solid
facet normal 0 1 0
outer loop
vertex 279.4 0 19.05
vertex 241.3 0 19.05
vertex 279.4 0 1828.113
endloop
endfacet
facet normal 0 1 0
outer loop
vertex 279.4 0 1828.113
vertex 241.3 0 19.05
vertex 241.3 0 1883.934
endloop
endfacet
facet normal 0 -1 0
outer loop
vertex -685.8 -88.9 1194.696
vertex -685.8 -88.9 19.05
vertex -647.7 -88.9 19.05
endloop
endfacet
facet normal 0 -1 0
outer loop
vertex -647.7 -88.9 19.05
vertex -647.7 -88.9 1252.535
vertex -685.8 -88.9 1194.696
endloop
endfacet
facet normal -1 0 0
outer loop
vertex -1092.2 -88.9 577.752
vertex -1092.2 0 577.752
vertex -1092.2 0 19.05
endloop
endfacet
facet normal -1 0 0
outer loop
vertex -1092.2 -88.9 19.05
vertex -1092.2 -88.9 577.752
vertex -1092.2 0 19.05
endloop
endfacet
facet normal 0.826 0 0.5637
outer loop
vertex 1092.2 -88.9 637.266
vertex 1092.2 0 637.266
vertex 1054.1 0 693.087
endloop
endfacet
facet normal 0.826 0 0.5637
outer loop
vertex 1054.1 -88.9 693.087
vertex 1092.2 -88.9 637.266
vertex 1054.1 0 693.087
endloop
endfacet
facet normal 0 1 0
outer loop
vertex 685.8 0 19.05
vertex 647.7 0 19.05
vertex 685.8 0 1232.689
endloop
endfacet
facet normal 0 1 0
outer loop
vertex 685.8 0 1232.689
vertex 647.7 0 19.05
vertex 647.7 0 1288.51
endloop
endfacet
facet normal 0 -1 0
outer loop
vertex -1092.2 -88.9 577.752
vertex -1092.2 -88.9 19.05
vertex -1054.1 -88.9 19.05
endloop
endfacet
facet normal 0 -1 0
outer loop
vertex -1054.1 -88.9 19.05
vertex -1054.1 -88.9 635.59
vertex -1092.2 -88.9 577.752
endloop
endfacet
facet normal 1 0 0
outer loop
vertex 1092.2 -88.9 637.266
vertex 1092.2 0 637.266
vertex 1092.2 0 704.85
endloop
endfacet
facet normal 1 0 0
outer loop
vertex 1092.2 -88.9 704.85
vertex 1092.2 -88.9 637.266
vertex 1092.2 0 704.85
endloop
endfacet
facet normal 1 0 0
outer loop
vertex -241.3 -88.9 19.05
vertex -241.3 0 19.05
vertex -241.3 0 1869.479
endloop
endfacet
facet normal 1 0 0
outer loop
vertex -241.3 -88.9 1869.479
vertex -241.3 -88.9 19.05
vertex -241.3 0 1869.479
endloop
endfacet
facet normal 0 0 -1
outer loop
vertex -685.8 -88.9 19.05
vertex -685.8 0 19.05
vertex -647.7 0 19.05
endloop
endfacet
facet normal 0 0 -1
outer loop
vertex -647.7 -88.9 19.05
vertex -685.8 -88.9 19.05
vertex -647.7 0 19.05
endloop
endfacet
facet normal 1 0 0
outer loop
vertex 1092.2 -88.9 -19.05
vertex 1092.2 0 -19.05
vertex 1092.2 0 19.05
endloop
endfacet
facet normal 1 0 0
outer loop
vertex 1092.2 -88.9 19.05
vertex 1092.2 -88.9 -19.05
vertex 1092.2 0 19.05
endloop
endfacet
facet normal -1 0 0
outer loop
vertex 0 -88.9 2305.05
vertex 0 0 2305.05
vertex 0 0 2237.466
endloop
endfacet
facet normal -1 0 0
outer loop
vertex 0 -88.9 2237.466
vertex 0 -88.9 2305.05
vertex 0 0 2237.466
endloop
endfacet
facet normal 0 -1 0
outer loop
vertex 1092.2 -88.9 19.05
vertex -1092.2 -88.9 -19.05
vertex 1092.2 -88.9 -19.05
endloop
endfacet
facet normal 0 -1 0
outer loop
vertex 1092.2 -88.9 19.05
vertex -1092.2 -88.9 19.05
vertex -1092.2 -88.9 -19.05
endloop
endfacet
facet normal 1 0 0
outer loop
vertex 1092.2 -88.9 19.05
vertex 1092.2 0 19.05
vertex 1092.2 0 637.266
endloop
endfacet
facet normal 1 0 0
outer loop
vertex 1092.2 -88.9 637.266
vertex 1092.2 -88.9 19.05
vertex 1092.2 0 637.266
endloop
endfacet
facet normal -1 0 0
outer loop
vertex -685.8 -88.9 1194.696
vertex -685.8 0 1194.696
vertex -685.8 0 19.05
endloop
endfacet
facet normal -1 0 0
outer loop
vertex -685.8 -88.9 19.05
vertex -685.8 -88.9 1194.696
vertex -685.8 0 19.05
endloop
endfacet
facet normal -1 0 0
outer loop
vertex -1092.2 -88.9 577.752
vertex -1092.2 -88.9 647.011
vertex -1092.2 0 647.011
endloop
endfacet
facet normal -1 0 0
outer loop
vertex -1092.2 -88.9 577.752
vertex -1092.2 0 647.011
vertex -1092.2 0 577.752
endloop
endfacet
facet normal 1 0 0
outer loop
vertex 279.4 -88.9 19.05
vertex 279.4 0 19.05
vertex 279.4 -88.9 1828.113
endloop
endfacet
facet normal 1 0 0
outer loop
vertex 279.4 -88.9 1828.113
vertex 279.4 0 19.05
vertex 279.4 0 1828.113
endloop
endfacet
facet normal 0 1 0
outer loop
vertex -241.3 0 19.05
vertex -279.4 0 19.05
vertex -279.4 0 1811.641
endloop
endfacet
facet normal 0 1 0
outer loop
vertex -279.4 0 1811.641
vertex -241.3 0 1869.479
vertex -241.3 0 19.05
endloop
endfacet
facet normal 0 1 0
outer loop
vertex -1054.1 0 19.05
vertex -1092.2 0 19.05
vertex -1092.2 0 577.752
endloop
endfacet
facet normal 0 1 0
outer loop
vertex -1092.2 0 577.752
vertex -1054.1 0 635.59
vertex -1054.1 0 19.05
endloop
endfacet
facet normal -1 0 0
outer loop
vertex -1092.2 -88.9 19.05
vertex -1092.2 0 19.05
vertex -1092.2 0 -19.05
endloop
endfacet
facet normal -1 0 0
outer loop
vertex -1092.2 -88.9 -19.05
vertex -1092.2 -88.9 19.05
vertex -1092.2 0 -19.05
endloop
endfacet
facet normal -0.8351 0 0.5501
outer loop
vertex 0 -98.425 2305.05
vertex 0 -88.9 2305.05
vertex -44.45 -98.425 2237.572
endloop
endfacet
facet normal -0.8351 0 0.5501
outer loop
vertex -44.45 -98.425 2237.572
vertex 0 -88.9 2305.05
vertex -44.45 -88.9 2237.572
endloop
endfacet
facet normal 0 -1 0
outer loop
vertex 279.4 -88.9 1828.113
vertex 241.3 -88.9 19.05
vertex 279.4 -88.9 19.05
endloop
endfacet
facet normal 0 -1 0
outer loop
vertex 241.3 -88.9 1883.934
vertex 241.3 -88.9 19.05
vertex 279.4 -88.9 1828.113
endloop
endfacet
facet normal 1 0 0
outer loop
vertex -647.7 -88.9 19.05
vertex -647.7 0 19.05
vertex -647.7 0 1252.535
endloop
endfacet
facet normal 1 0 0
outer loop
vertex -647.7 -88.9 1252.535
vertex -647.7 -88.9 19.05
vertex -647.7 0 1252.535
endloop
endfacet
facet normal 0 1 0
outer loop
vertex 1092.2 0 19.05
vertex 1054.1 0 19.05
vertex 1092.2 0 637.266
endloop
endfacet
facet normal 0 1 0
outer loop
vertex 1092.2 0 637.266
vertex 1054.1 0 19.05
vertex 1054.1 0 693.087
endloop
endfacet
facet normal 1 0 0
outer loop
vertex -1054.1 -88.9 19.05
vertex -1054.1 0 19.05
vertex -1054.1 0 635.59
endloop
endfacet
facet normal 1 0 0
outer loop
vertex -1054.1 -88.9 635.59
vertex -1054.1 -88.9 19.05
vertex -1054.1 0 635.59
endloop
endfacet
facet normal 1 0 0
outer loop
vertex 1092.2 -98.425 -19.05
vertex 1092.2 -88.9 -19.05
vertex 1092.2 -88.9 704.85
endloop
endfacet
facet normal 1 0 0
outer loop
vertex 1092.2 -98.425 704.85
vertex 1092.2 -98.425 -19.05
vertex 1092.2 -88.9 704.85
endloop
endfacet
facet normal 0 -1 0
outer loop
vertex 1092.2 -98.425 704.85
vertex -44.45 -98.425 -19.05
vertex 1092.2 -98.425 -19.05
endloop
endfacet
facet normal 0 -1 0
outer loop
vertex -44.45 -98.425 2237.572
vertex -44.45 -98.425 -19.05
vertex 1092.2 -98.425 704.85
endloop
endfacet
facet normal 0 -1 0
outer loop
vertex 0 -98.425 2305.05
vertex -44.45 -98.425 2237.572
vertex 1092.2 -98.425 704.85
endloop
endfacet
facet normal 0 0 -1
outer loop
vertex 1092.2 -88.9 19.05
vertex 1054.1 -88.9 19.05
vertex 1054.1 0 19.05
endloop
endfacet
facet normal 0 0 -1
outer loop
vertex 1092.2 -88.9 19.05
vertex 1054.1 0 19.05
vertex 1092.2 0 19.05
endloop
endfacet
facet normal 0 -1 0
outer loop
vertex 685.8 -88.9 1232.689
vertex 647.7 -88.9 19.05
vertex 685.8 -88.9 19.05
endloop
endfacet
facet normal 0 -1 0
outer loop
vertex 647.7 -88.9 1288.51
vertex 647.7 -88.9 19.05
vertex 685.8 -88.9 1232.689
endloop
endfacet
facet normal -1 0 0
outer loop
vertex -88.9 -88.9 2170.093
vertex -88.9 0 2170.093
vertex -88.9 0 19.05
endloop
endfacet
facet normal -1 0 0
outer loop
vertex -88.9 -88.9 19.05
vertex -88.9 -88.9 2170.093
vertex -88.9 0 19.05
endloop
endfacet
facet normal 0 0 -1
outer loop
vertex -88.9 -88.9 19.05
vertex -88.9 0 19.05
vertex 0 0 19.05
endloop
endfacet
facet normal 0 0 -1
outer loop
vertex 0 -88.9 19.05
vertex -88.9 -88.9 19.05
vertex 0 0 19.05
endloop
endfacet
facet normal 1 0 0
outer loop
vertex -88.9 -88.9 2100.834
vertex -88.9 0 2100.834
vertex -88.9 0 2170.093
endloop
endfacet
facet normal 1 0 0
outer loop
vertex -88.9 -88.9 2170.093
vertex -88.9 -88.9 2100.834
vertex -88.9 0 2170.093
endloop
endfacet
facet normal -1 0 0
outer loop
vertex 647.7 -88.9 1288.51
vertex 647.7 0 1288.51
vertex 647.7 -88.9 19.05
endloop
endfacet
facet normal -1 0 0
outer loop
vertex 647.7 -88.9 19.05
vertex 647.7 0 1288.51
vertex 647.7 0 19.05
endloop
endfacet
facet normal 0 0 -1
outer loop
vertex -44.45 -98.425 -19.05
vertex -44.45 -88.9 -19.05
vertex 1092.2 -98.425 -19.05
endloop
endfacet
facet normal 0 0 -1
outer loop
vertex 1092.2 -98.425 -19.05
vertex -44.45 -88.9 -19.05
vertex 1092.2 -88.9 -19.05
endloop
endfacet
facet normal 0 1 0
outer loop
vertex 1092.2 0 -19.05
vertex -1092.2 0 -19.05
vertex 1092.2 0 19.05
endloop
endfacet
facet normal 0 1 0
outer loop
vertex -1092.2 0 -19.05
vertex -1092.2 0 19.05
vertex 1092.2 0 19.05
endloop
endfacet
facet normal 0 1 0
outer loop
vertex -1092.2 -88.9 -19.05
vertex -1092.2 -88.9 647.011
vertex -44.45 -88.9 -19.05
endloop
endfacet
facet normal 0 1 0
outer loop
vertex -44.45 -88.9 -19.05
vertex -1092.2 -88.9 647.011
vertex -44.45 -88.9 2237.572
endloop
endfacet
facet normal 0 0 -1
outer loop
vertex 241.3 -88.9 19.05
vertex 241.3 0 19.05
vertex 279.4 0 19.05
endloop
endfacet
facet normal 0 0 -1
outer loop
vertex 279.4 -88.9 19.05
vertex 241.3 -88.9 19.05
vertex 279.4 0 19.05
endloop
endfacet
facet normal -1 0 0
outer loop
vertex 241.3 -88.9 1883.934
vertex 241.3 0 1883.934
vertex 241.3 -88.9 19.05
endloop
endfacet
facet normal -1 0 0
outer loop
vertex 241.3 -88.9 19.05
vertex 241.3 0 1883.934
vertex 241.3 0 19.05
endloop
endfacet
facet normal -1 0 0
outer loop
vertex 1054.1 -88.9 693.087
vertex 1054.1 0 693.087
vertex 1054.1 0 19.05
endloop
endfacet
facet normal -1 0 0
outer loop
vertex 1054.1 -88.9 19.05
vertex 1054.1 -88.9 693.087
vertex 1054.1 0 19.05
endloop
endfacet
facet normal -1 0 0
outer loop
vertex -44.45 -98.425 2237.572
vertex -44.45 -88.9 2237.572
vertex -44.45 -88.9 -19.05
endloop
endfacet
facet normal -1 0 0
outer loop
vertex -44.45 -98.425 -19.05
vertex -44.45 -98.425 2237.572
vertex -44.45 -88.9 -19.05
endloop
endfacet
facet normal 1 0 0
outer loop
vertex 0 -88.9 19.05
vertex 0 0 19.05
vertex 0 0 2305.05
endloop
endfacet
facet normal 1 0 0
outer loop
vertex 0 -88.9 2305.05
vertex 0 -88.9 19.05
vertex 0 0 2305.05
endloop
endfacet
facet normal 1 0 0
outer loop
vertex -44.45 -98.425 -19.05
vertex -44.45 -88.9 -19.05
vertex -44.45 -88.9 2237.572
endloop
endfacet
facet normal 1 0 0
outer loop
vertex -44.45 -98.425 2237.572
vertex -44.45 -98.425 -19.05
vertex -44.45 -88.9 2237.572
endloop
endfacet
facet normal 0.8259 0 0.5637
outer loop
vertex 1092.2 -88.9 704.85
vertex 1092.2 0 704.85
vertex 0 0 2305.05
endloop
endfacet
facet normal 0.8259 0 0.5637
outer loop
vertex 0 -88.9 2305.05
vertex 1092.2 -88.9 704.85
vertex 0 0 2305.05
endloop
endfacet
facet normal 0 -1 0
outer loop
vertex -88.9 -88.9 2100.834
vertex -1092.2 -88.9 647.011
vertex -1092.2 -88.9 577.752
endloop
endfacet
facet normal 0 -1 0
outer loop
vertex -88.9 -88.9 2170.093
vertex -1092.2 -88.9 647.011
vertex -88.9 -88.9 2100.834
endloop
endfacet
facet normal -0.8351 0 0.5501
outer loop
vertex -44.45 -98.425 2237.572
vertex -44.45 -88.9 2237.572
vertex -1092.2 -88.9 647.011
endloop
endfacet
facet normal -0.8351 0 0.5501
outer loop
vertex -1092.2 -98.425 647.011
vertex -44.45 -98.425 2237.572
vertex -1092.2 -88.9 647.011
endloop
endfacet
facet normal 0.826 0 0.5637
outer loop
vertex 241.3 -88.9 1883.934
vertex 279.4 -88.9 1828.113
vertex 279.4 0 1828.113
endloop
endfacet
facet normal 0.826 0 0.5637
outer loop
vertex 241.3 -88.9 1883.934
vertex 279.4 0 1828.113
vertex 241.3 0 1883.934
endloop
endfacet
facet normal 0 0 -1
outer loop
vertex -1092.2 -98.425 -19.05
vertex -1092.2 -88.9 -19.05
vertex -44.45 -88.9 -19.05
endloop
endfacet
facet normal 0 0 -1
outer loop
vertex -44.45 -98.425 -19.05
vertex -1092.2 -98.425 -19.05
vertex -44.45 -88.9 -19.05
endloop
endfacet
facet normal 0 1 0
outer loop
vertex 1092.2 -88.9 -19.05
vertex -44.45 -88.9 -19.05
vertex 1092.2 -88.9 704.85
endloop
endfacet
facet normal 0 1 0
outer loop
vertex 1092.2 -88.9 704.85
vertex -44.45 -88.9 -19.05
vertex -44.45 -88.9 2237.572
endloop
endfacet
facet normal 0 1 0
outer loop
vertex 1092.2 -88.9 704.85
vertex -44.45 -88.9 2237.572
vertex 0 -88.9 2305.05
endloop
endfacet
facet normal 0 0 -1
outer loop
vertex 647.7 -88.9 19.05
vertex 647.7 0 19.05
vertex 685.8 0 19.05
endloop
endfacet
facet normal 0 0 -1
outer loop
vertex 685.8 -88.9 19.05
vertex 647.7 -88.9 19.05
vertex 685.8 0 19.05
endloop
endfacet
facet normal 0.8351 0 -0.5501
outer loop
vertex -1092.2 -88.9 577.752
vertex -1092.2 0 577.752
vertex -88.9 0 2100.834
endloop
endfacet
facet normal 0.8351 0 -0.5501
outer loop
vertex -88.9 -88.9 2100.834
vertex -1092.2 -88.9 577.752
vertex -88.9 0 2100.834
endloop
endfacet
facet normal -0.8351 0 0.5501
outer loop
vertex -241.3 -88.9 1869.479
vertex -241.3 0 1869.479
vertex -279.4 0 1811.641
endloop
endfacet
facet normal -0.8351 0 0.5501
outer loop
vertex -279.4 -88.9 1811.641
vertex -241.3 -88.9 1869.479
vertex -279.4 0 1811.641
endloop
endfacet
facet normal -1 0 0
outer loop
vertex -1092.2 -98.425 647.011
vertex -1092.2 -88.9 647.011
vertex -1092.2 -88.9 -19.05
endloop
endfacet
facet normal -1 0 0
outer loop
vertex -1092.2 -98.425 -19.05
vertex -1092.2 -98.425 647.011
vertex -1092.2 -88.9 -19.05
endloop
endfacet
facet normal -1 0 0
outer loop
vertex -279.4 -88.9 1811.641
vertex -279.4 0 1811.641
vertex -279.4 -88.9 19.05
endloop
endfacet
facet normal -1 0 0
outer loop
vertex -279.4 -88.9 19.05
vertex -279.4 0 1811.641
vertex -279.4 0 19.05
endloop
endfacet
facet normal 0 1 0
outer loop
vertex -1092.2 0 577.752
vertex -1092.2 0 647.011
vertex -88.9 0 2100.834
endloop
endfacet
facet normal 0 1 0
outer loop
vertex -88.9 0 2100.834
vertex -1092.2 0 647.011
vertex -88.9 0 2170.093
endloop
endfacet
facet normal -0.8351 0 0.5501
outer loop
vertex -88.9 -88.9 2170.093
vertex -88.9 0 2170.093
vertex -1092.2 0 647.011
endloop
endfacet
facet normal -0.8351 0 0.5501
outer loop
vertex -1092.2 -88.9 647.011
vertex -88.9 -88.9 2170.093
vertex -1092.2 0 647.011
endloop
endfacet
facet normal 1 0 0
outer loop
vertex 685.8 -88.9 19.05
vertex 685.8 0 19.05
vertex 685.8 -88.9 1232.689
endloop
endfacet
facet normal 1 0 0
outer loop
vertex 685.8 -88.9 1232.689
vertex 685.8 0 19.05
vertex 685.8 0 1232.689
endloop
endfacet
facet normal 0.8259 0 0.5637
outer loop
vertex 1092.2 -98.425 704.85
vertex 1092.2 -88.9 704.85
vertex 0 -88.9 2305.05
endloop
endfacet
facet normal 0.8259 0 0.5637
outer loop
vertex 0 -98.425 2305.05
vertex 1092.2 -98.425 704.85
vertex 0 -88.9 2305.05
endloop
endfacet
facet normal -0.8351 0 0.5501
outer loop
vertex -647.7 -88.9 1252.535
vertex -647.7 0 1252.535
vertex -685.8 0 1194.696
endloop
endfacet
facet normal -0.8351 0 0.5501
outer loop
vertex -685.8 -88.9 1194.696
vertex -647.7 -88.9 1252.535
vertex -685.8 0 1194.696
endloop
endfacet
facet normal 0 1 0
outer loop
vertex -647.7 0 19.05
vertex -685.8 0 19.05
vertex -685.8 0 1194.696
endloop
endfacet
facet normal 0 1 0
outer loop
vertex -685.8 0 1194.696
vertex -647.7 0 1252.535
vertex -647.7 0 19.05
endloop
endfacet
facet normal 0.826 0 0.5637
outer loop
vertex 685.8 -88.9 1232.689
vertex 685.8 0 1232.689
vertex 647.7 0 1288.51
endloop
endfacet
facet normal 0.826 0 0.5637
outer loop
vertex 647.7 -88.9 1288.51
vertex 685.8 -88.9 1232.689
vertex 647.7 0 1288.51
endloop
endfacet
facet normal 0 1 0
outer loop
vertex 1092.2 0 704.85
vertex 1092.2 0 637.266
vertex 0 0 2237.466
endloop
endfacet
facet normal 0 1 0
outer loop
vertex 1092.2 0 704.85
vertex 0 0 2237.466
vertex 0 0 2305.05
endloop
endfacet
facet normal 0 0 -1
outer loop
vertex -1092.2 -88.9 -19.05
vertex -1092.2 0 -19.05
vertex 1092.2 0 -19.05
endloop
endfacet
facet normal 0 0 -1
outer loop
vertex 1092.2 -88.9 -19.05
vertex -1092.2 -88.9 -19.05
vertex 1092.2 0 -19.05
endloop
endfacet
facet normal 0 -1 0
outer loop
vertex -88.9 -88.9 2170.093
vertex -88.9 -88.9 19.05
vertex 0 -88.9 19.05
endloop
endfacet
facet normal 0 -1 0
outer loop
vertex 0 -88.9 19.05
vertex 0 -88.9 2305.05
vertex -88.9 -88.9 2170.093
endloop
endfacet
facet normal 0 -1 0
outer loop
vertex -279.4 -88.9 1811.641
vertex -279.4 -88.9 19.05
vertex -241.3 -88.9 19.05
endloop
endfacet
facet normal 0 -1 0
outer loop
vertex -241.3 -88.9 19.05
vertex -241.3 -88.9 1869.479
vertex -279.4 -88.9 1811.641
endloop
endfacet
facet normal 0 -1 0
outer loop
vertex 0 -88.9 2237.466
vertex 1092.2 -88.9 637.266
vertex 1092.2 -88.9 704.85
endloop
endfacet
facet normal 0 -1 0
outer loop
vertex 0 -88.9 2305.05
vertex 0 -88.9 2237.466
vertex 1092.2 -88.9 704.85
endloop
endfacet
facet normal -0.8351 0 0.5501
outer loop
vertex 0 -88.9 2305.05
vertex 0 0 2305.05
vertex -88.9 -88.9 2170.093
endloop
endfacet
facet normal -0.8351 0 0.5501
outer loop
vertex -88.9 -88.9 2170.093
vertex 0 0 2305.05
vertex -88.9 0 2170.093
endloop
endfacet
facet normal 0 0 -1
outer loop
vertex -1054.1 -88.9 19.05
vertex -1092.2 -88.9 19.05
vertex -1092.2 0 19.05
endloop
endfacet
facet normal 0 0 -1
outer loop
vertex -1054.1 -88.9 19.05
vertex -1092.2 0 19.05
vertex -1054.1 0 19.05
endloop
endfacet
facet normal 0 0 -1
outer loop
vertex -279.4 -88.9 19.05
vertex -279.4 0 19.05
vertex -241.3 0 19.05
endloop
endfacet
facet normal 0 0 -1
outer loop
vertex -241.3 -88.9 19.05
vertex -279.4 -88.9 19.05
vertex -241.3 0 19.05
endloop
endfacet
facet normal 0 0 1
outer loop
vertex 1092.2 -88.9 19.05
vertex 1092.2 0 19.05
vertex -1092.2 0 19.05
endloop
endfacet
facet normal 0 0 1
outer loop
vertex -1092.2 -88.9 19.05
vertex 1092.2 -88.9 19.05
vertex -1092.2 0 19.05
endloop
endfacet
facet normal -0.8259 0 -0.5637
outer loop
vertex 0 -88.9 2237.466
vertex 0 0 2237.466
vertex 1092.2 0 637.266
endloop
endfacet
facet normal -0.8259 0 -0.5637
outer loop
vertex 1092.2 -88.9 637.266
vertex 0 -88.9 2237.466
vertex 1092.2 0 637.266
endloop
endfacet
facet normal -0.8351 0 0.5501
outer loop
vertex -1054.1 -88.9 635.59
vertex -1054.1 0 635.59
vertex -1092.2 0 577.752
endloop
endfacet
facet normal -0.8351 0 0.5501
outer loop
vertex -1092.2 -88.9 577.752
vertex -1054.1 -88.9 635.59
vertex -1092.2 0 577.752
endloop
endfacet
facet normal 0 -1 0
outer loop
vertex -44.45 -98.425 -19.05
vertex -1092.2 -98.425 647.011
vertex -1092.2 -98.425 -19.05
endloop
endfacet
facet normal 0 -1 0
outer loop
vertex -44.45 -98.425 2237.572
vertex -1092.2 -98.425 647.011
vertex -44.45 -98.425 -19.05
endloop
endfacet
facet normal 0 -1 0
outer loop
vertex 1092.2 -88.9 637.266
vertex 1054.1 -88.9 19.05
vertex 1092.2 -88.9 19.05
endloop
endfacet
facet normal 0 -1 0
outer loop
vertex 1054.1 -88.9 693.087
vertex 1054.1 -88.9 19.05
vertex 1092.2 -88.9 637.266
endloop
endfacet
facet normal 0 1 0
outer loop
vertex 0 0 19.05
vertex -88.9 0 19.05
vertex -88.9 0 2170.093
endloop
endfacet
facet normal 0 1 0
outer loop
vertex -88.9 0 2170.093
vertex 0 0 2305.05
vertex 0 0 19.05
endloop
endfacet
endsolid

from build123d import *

# Parameters (mm, degrees)
F1_DEPTH = 88.9
F2_DEPTH = 88.9
F4_DEPTH = 9.525
F5_DEPTH = 9.525


with BuildPart() as f1:
    # F0 (on Front) → F1 (new body)
    with BuildSketch(Plane.XZ):
        Polygon((-1092.2, 577.7517291082), (-1092.2, 19.05), (-1054.1, 19.05), (-1054.1, 635.590283325), align=None)
    extrude(amount=F1_DEPTH)


with BuildPart() as f1b:
    # F0 (on Front) → F1, piece 2 (new body)
    with BuildSketch(Plane.XZ):
        Polygon((-685.8, 1194.6963074214), (-685.8, 19.05), (-647.7, 19.05), (-647.7, 1252.5348616383), align=None)
    extrude(amount=F1_DEPTH)


with BuildPart() as f1c:
    # F0 (on Front) → F1, piece 3 (new body)
    with BuildSketch(Plane.XZ):
        Polygon((-279.4, 1811.6408857347), (-279.4, 19.05), (-241.3, 19.05), (-241.3, 1869.4794399515), align=None)
    extrude(amount=F1_DEPTH)


with BuildPart() as f1d:
    # F0 (on Front) → F1, piece 4 (new body)
    with BuildSketch(Plane.XZ):
        Polygon((0, 2237.46607993), (0, 2305.05), (-88.9, 2170.093373494), (-88.9, 2100.833656819), (-88.9, 19.05), (0, 19.05), align=None)
    extrude(amount=F1_DEPTH)


with BuildPart() as f1e:
    # F0 (on Front) → F1, piece 5 (new body)
    with BuildSketch(Plane.XZ):
        Polygon((241.3, 19.05), (279.4, 19.05), (279.4, 1828.1125915579), (241.3, 1883.9335217905), align=None)
    extrude(amount=F1_DEPTH)


with BuildPart() as f1f:
    # F0 (on Front) → F1, piece 6 (new body)
    with BuildSketch(Plane.XZ):
        Polygon((647.7, 19.05), (685.8, 19.05), (685.8, 1232.689335744), (647.7, 1288.5102659765), align=None)
    extrude(amount=F1_DEPTH)


with BuildPart() as f1g:
    # F0 (on Front) → F1, piece 7 (new body)
    with BuildSketch(Plane.XZ):
        Polygon((1054.1, 19.05), (1092.2, 19.05), (1092.2, 637.26607993), (1054.1, 693.0870101626), align=None)
    extrude(amount=F1_DEPTH)


with BuildPart() as f2:
    # F0 (on Front) → F2 (new body)
    with BuildSketch(Plane.XZ):
        Polygon((-1054.1, 704.85), (-1054.1, 635.590283325), (-685.8, 1194.6963074214), (-647.7, 1252.5348616383), (-279.4, 1811.6408857347), (-241.3, 1869.4794399515), (-88.9, 2100.833656819), (-88.9, 2170.093373494), align=None)
        Polygon((-1092.2, 647.0114457831), (-1092.2, 577.7517291082), (-1054.1, 635.590283325), (-1054.1, 704.85), align=None)
    extrude(amount=F2_DEPTH)


with BuildPart() as f2b:
    # F0 (on Front) → F2, piece 2 (new body)
    with BuildSketch(Plane.XZ):
        Polygon((685.8, 1232.689335744), (1054.1, 693.0870101626), (1054.1, 704.85), (1092.2, 704.85), (0, 2305.05), (0, 2237.46607993), (241.3, 1883.9335217905), (279.4, 1828.1125915579), (647.7, 1288.5102659765), align=None)
        Polygon((1054.1, 693.0870101626), (1092.2, 637.26607993), (1092.2, 704.85), (1054.1, 704.85), align=None)
    extrude(amount=F2_DEPTH)


with BuildPart() as f2c:
    # F0 (on Front) → F2, piece 3 (new body)
    with BuildSketch(Plane.XZ):
        Polygon((-1092.2, -19.05), (1092.2, -19.05), (1092.2, 19.05), (1054.1, 19.05), (685.8, 19.05), (647.7, 19.05), (279.4, 19.05), (241.3, 19.05), (0, 19.05), (-88.9, 19.05), (-241.3, 19.05), (-279.4, 19.05), (-647.7, 19.05), (-685.8, 19.05), (-1054.1, 19.05), (-1092.2, 19.05), align=None)
    extrude(amount=F2_DEPTH)


with BuildPart() as f4:
    # F3 (on face) → F4 (new body)
    with BuildSketch(Plane.XZ.offset(88.9)):
        Polygon((-88.9, 19.05), (-1092.2, 19.05), (-1092.2, -19.05), (-44.45, -19.05), (-44.45, 19.05), align=None)
        Polygon((-1092.2, 577.7517291082), (-1092.2, 19.05), (-88.9, 19.05), (-88.9, 2170.093373494), (-1092.2, 647.0114457831), align=None)
        Polygon((-88.9, 2170.093373494), (-88.9, 19.05), (-44.45, 19.05), (-44.45, 2237.571686747), align=None)
    extrude(amount=F4_DEPTH)


with BuildPart() as f5:
    # F3 (on face) → F5 (new body)
    with BuildSketch(Plane.XZ.offset(88.9)):
        Polygon((0, 2305.05), (0, 19.05), (1092.2, 19.05), (1092.2, 637.26607993), (1092.2, 704.85), align=None)
        Polygon((-44.45, 19.05), (-44.45, -19.05), (1092.2, -19.05), (1092.2, 19.05), (0, 19.05), align=None)
        Polygon((-44.45, 2237.571686747), (-44.45, 19.05), (0, 19.05), (0, 2305.05), align=None)
    extrude(amount=F5_DEPTH)


solid = Compound([f1.part, f1b.part, f1c.part, f1d.part, f1e.part, f1f.part, f1g.part, f2.part, f2b.part, f2c.part, f4.part, f5.part])
